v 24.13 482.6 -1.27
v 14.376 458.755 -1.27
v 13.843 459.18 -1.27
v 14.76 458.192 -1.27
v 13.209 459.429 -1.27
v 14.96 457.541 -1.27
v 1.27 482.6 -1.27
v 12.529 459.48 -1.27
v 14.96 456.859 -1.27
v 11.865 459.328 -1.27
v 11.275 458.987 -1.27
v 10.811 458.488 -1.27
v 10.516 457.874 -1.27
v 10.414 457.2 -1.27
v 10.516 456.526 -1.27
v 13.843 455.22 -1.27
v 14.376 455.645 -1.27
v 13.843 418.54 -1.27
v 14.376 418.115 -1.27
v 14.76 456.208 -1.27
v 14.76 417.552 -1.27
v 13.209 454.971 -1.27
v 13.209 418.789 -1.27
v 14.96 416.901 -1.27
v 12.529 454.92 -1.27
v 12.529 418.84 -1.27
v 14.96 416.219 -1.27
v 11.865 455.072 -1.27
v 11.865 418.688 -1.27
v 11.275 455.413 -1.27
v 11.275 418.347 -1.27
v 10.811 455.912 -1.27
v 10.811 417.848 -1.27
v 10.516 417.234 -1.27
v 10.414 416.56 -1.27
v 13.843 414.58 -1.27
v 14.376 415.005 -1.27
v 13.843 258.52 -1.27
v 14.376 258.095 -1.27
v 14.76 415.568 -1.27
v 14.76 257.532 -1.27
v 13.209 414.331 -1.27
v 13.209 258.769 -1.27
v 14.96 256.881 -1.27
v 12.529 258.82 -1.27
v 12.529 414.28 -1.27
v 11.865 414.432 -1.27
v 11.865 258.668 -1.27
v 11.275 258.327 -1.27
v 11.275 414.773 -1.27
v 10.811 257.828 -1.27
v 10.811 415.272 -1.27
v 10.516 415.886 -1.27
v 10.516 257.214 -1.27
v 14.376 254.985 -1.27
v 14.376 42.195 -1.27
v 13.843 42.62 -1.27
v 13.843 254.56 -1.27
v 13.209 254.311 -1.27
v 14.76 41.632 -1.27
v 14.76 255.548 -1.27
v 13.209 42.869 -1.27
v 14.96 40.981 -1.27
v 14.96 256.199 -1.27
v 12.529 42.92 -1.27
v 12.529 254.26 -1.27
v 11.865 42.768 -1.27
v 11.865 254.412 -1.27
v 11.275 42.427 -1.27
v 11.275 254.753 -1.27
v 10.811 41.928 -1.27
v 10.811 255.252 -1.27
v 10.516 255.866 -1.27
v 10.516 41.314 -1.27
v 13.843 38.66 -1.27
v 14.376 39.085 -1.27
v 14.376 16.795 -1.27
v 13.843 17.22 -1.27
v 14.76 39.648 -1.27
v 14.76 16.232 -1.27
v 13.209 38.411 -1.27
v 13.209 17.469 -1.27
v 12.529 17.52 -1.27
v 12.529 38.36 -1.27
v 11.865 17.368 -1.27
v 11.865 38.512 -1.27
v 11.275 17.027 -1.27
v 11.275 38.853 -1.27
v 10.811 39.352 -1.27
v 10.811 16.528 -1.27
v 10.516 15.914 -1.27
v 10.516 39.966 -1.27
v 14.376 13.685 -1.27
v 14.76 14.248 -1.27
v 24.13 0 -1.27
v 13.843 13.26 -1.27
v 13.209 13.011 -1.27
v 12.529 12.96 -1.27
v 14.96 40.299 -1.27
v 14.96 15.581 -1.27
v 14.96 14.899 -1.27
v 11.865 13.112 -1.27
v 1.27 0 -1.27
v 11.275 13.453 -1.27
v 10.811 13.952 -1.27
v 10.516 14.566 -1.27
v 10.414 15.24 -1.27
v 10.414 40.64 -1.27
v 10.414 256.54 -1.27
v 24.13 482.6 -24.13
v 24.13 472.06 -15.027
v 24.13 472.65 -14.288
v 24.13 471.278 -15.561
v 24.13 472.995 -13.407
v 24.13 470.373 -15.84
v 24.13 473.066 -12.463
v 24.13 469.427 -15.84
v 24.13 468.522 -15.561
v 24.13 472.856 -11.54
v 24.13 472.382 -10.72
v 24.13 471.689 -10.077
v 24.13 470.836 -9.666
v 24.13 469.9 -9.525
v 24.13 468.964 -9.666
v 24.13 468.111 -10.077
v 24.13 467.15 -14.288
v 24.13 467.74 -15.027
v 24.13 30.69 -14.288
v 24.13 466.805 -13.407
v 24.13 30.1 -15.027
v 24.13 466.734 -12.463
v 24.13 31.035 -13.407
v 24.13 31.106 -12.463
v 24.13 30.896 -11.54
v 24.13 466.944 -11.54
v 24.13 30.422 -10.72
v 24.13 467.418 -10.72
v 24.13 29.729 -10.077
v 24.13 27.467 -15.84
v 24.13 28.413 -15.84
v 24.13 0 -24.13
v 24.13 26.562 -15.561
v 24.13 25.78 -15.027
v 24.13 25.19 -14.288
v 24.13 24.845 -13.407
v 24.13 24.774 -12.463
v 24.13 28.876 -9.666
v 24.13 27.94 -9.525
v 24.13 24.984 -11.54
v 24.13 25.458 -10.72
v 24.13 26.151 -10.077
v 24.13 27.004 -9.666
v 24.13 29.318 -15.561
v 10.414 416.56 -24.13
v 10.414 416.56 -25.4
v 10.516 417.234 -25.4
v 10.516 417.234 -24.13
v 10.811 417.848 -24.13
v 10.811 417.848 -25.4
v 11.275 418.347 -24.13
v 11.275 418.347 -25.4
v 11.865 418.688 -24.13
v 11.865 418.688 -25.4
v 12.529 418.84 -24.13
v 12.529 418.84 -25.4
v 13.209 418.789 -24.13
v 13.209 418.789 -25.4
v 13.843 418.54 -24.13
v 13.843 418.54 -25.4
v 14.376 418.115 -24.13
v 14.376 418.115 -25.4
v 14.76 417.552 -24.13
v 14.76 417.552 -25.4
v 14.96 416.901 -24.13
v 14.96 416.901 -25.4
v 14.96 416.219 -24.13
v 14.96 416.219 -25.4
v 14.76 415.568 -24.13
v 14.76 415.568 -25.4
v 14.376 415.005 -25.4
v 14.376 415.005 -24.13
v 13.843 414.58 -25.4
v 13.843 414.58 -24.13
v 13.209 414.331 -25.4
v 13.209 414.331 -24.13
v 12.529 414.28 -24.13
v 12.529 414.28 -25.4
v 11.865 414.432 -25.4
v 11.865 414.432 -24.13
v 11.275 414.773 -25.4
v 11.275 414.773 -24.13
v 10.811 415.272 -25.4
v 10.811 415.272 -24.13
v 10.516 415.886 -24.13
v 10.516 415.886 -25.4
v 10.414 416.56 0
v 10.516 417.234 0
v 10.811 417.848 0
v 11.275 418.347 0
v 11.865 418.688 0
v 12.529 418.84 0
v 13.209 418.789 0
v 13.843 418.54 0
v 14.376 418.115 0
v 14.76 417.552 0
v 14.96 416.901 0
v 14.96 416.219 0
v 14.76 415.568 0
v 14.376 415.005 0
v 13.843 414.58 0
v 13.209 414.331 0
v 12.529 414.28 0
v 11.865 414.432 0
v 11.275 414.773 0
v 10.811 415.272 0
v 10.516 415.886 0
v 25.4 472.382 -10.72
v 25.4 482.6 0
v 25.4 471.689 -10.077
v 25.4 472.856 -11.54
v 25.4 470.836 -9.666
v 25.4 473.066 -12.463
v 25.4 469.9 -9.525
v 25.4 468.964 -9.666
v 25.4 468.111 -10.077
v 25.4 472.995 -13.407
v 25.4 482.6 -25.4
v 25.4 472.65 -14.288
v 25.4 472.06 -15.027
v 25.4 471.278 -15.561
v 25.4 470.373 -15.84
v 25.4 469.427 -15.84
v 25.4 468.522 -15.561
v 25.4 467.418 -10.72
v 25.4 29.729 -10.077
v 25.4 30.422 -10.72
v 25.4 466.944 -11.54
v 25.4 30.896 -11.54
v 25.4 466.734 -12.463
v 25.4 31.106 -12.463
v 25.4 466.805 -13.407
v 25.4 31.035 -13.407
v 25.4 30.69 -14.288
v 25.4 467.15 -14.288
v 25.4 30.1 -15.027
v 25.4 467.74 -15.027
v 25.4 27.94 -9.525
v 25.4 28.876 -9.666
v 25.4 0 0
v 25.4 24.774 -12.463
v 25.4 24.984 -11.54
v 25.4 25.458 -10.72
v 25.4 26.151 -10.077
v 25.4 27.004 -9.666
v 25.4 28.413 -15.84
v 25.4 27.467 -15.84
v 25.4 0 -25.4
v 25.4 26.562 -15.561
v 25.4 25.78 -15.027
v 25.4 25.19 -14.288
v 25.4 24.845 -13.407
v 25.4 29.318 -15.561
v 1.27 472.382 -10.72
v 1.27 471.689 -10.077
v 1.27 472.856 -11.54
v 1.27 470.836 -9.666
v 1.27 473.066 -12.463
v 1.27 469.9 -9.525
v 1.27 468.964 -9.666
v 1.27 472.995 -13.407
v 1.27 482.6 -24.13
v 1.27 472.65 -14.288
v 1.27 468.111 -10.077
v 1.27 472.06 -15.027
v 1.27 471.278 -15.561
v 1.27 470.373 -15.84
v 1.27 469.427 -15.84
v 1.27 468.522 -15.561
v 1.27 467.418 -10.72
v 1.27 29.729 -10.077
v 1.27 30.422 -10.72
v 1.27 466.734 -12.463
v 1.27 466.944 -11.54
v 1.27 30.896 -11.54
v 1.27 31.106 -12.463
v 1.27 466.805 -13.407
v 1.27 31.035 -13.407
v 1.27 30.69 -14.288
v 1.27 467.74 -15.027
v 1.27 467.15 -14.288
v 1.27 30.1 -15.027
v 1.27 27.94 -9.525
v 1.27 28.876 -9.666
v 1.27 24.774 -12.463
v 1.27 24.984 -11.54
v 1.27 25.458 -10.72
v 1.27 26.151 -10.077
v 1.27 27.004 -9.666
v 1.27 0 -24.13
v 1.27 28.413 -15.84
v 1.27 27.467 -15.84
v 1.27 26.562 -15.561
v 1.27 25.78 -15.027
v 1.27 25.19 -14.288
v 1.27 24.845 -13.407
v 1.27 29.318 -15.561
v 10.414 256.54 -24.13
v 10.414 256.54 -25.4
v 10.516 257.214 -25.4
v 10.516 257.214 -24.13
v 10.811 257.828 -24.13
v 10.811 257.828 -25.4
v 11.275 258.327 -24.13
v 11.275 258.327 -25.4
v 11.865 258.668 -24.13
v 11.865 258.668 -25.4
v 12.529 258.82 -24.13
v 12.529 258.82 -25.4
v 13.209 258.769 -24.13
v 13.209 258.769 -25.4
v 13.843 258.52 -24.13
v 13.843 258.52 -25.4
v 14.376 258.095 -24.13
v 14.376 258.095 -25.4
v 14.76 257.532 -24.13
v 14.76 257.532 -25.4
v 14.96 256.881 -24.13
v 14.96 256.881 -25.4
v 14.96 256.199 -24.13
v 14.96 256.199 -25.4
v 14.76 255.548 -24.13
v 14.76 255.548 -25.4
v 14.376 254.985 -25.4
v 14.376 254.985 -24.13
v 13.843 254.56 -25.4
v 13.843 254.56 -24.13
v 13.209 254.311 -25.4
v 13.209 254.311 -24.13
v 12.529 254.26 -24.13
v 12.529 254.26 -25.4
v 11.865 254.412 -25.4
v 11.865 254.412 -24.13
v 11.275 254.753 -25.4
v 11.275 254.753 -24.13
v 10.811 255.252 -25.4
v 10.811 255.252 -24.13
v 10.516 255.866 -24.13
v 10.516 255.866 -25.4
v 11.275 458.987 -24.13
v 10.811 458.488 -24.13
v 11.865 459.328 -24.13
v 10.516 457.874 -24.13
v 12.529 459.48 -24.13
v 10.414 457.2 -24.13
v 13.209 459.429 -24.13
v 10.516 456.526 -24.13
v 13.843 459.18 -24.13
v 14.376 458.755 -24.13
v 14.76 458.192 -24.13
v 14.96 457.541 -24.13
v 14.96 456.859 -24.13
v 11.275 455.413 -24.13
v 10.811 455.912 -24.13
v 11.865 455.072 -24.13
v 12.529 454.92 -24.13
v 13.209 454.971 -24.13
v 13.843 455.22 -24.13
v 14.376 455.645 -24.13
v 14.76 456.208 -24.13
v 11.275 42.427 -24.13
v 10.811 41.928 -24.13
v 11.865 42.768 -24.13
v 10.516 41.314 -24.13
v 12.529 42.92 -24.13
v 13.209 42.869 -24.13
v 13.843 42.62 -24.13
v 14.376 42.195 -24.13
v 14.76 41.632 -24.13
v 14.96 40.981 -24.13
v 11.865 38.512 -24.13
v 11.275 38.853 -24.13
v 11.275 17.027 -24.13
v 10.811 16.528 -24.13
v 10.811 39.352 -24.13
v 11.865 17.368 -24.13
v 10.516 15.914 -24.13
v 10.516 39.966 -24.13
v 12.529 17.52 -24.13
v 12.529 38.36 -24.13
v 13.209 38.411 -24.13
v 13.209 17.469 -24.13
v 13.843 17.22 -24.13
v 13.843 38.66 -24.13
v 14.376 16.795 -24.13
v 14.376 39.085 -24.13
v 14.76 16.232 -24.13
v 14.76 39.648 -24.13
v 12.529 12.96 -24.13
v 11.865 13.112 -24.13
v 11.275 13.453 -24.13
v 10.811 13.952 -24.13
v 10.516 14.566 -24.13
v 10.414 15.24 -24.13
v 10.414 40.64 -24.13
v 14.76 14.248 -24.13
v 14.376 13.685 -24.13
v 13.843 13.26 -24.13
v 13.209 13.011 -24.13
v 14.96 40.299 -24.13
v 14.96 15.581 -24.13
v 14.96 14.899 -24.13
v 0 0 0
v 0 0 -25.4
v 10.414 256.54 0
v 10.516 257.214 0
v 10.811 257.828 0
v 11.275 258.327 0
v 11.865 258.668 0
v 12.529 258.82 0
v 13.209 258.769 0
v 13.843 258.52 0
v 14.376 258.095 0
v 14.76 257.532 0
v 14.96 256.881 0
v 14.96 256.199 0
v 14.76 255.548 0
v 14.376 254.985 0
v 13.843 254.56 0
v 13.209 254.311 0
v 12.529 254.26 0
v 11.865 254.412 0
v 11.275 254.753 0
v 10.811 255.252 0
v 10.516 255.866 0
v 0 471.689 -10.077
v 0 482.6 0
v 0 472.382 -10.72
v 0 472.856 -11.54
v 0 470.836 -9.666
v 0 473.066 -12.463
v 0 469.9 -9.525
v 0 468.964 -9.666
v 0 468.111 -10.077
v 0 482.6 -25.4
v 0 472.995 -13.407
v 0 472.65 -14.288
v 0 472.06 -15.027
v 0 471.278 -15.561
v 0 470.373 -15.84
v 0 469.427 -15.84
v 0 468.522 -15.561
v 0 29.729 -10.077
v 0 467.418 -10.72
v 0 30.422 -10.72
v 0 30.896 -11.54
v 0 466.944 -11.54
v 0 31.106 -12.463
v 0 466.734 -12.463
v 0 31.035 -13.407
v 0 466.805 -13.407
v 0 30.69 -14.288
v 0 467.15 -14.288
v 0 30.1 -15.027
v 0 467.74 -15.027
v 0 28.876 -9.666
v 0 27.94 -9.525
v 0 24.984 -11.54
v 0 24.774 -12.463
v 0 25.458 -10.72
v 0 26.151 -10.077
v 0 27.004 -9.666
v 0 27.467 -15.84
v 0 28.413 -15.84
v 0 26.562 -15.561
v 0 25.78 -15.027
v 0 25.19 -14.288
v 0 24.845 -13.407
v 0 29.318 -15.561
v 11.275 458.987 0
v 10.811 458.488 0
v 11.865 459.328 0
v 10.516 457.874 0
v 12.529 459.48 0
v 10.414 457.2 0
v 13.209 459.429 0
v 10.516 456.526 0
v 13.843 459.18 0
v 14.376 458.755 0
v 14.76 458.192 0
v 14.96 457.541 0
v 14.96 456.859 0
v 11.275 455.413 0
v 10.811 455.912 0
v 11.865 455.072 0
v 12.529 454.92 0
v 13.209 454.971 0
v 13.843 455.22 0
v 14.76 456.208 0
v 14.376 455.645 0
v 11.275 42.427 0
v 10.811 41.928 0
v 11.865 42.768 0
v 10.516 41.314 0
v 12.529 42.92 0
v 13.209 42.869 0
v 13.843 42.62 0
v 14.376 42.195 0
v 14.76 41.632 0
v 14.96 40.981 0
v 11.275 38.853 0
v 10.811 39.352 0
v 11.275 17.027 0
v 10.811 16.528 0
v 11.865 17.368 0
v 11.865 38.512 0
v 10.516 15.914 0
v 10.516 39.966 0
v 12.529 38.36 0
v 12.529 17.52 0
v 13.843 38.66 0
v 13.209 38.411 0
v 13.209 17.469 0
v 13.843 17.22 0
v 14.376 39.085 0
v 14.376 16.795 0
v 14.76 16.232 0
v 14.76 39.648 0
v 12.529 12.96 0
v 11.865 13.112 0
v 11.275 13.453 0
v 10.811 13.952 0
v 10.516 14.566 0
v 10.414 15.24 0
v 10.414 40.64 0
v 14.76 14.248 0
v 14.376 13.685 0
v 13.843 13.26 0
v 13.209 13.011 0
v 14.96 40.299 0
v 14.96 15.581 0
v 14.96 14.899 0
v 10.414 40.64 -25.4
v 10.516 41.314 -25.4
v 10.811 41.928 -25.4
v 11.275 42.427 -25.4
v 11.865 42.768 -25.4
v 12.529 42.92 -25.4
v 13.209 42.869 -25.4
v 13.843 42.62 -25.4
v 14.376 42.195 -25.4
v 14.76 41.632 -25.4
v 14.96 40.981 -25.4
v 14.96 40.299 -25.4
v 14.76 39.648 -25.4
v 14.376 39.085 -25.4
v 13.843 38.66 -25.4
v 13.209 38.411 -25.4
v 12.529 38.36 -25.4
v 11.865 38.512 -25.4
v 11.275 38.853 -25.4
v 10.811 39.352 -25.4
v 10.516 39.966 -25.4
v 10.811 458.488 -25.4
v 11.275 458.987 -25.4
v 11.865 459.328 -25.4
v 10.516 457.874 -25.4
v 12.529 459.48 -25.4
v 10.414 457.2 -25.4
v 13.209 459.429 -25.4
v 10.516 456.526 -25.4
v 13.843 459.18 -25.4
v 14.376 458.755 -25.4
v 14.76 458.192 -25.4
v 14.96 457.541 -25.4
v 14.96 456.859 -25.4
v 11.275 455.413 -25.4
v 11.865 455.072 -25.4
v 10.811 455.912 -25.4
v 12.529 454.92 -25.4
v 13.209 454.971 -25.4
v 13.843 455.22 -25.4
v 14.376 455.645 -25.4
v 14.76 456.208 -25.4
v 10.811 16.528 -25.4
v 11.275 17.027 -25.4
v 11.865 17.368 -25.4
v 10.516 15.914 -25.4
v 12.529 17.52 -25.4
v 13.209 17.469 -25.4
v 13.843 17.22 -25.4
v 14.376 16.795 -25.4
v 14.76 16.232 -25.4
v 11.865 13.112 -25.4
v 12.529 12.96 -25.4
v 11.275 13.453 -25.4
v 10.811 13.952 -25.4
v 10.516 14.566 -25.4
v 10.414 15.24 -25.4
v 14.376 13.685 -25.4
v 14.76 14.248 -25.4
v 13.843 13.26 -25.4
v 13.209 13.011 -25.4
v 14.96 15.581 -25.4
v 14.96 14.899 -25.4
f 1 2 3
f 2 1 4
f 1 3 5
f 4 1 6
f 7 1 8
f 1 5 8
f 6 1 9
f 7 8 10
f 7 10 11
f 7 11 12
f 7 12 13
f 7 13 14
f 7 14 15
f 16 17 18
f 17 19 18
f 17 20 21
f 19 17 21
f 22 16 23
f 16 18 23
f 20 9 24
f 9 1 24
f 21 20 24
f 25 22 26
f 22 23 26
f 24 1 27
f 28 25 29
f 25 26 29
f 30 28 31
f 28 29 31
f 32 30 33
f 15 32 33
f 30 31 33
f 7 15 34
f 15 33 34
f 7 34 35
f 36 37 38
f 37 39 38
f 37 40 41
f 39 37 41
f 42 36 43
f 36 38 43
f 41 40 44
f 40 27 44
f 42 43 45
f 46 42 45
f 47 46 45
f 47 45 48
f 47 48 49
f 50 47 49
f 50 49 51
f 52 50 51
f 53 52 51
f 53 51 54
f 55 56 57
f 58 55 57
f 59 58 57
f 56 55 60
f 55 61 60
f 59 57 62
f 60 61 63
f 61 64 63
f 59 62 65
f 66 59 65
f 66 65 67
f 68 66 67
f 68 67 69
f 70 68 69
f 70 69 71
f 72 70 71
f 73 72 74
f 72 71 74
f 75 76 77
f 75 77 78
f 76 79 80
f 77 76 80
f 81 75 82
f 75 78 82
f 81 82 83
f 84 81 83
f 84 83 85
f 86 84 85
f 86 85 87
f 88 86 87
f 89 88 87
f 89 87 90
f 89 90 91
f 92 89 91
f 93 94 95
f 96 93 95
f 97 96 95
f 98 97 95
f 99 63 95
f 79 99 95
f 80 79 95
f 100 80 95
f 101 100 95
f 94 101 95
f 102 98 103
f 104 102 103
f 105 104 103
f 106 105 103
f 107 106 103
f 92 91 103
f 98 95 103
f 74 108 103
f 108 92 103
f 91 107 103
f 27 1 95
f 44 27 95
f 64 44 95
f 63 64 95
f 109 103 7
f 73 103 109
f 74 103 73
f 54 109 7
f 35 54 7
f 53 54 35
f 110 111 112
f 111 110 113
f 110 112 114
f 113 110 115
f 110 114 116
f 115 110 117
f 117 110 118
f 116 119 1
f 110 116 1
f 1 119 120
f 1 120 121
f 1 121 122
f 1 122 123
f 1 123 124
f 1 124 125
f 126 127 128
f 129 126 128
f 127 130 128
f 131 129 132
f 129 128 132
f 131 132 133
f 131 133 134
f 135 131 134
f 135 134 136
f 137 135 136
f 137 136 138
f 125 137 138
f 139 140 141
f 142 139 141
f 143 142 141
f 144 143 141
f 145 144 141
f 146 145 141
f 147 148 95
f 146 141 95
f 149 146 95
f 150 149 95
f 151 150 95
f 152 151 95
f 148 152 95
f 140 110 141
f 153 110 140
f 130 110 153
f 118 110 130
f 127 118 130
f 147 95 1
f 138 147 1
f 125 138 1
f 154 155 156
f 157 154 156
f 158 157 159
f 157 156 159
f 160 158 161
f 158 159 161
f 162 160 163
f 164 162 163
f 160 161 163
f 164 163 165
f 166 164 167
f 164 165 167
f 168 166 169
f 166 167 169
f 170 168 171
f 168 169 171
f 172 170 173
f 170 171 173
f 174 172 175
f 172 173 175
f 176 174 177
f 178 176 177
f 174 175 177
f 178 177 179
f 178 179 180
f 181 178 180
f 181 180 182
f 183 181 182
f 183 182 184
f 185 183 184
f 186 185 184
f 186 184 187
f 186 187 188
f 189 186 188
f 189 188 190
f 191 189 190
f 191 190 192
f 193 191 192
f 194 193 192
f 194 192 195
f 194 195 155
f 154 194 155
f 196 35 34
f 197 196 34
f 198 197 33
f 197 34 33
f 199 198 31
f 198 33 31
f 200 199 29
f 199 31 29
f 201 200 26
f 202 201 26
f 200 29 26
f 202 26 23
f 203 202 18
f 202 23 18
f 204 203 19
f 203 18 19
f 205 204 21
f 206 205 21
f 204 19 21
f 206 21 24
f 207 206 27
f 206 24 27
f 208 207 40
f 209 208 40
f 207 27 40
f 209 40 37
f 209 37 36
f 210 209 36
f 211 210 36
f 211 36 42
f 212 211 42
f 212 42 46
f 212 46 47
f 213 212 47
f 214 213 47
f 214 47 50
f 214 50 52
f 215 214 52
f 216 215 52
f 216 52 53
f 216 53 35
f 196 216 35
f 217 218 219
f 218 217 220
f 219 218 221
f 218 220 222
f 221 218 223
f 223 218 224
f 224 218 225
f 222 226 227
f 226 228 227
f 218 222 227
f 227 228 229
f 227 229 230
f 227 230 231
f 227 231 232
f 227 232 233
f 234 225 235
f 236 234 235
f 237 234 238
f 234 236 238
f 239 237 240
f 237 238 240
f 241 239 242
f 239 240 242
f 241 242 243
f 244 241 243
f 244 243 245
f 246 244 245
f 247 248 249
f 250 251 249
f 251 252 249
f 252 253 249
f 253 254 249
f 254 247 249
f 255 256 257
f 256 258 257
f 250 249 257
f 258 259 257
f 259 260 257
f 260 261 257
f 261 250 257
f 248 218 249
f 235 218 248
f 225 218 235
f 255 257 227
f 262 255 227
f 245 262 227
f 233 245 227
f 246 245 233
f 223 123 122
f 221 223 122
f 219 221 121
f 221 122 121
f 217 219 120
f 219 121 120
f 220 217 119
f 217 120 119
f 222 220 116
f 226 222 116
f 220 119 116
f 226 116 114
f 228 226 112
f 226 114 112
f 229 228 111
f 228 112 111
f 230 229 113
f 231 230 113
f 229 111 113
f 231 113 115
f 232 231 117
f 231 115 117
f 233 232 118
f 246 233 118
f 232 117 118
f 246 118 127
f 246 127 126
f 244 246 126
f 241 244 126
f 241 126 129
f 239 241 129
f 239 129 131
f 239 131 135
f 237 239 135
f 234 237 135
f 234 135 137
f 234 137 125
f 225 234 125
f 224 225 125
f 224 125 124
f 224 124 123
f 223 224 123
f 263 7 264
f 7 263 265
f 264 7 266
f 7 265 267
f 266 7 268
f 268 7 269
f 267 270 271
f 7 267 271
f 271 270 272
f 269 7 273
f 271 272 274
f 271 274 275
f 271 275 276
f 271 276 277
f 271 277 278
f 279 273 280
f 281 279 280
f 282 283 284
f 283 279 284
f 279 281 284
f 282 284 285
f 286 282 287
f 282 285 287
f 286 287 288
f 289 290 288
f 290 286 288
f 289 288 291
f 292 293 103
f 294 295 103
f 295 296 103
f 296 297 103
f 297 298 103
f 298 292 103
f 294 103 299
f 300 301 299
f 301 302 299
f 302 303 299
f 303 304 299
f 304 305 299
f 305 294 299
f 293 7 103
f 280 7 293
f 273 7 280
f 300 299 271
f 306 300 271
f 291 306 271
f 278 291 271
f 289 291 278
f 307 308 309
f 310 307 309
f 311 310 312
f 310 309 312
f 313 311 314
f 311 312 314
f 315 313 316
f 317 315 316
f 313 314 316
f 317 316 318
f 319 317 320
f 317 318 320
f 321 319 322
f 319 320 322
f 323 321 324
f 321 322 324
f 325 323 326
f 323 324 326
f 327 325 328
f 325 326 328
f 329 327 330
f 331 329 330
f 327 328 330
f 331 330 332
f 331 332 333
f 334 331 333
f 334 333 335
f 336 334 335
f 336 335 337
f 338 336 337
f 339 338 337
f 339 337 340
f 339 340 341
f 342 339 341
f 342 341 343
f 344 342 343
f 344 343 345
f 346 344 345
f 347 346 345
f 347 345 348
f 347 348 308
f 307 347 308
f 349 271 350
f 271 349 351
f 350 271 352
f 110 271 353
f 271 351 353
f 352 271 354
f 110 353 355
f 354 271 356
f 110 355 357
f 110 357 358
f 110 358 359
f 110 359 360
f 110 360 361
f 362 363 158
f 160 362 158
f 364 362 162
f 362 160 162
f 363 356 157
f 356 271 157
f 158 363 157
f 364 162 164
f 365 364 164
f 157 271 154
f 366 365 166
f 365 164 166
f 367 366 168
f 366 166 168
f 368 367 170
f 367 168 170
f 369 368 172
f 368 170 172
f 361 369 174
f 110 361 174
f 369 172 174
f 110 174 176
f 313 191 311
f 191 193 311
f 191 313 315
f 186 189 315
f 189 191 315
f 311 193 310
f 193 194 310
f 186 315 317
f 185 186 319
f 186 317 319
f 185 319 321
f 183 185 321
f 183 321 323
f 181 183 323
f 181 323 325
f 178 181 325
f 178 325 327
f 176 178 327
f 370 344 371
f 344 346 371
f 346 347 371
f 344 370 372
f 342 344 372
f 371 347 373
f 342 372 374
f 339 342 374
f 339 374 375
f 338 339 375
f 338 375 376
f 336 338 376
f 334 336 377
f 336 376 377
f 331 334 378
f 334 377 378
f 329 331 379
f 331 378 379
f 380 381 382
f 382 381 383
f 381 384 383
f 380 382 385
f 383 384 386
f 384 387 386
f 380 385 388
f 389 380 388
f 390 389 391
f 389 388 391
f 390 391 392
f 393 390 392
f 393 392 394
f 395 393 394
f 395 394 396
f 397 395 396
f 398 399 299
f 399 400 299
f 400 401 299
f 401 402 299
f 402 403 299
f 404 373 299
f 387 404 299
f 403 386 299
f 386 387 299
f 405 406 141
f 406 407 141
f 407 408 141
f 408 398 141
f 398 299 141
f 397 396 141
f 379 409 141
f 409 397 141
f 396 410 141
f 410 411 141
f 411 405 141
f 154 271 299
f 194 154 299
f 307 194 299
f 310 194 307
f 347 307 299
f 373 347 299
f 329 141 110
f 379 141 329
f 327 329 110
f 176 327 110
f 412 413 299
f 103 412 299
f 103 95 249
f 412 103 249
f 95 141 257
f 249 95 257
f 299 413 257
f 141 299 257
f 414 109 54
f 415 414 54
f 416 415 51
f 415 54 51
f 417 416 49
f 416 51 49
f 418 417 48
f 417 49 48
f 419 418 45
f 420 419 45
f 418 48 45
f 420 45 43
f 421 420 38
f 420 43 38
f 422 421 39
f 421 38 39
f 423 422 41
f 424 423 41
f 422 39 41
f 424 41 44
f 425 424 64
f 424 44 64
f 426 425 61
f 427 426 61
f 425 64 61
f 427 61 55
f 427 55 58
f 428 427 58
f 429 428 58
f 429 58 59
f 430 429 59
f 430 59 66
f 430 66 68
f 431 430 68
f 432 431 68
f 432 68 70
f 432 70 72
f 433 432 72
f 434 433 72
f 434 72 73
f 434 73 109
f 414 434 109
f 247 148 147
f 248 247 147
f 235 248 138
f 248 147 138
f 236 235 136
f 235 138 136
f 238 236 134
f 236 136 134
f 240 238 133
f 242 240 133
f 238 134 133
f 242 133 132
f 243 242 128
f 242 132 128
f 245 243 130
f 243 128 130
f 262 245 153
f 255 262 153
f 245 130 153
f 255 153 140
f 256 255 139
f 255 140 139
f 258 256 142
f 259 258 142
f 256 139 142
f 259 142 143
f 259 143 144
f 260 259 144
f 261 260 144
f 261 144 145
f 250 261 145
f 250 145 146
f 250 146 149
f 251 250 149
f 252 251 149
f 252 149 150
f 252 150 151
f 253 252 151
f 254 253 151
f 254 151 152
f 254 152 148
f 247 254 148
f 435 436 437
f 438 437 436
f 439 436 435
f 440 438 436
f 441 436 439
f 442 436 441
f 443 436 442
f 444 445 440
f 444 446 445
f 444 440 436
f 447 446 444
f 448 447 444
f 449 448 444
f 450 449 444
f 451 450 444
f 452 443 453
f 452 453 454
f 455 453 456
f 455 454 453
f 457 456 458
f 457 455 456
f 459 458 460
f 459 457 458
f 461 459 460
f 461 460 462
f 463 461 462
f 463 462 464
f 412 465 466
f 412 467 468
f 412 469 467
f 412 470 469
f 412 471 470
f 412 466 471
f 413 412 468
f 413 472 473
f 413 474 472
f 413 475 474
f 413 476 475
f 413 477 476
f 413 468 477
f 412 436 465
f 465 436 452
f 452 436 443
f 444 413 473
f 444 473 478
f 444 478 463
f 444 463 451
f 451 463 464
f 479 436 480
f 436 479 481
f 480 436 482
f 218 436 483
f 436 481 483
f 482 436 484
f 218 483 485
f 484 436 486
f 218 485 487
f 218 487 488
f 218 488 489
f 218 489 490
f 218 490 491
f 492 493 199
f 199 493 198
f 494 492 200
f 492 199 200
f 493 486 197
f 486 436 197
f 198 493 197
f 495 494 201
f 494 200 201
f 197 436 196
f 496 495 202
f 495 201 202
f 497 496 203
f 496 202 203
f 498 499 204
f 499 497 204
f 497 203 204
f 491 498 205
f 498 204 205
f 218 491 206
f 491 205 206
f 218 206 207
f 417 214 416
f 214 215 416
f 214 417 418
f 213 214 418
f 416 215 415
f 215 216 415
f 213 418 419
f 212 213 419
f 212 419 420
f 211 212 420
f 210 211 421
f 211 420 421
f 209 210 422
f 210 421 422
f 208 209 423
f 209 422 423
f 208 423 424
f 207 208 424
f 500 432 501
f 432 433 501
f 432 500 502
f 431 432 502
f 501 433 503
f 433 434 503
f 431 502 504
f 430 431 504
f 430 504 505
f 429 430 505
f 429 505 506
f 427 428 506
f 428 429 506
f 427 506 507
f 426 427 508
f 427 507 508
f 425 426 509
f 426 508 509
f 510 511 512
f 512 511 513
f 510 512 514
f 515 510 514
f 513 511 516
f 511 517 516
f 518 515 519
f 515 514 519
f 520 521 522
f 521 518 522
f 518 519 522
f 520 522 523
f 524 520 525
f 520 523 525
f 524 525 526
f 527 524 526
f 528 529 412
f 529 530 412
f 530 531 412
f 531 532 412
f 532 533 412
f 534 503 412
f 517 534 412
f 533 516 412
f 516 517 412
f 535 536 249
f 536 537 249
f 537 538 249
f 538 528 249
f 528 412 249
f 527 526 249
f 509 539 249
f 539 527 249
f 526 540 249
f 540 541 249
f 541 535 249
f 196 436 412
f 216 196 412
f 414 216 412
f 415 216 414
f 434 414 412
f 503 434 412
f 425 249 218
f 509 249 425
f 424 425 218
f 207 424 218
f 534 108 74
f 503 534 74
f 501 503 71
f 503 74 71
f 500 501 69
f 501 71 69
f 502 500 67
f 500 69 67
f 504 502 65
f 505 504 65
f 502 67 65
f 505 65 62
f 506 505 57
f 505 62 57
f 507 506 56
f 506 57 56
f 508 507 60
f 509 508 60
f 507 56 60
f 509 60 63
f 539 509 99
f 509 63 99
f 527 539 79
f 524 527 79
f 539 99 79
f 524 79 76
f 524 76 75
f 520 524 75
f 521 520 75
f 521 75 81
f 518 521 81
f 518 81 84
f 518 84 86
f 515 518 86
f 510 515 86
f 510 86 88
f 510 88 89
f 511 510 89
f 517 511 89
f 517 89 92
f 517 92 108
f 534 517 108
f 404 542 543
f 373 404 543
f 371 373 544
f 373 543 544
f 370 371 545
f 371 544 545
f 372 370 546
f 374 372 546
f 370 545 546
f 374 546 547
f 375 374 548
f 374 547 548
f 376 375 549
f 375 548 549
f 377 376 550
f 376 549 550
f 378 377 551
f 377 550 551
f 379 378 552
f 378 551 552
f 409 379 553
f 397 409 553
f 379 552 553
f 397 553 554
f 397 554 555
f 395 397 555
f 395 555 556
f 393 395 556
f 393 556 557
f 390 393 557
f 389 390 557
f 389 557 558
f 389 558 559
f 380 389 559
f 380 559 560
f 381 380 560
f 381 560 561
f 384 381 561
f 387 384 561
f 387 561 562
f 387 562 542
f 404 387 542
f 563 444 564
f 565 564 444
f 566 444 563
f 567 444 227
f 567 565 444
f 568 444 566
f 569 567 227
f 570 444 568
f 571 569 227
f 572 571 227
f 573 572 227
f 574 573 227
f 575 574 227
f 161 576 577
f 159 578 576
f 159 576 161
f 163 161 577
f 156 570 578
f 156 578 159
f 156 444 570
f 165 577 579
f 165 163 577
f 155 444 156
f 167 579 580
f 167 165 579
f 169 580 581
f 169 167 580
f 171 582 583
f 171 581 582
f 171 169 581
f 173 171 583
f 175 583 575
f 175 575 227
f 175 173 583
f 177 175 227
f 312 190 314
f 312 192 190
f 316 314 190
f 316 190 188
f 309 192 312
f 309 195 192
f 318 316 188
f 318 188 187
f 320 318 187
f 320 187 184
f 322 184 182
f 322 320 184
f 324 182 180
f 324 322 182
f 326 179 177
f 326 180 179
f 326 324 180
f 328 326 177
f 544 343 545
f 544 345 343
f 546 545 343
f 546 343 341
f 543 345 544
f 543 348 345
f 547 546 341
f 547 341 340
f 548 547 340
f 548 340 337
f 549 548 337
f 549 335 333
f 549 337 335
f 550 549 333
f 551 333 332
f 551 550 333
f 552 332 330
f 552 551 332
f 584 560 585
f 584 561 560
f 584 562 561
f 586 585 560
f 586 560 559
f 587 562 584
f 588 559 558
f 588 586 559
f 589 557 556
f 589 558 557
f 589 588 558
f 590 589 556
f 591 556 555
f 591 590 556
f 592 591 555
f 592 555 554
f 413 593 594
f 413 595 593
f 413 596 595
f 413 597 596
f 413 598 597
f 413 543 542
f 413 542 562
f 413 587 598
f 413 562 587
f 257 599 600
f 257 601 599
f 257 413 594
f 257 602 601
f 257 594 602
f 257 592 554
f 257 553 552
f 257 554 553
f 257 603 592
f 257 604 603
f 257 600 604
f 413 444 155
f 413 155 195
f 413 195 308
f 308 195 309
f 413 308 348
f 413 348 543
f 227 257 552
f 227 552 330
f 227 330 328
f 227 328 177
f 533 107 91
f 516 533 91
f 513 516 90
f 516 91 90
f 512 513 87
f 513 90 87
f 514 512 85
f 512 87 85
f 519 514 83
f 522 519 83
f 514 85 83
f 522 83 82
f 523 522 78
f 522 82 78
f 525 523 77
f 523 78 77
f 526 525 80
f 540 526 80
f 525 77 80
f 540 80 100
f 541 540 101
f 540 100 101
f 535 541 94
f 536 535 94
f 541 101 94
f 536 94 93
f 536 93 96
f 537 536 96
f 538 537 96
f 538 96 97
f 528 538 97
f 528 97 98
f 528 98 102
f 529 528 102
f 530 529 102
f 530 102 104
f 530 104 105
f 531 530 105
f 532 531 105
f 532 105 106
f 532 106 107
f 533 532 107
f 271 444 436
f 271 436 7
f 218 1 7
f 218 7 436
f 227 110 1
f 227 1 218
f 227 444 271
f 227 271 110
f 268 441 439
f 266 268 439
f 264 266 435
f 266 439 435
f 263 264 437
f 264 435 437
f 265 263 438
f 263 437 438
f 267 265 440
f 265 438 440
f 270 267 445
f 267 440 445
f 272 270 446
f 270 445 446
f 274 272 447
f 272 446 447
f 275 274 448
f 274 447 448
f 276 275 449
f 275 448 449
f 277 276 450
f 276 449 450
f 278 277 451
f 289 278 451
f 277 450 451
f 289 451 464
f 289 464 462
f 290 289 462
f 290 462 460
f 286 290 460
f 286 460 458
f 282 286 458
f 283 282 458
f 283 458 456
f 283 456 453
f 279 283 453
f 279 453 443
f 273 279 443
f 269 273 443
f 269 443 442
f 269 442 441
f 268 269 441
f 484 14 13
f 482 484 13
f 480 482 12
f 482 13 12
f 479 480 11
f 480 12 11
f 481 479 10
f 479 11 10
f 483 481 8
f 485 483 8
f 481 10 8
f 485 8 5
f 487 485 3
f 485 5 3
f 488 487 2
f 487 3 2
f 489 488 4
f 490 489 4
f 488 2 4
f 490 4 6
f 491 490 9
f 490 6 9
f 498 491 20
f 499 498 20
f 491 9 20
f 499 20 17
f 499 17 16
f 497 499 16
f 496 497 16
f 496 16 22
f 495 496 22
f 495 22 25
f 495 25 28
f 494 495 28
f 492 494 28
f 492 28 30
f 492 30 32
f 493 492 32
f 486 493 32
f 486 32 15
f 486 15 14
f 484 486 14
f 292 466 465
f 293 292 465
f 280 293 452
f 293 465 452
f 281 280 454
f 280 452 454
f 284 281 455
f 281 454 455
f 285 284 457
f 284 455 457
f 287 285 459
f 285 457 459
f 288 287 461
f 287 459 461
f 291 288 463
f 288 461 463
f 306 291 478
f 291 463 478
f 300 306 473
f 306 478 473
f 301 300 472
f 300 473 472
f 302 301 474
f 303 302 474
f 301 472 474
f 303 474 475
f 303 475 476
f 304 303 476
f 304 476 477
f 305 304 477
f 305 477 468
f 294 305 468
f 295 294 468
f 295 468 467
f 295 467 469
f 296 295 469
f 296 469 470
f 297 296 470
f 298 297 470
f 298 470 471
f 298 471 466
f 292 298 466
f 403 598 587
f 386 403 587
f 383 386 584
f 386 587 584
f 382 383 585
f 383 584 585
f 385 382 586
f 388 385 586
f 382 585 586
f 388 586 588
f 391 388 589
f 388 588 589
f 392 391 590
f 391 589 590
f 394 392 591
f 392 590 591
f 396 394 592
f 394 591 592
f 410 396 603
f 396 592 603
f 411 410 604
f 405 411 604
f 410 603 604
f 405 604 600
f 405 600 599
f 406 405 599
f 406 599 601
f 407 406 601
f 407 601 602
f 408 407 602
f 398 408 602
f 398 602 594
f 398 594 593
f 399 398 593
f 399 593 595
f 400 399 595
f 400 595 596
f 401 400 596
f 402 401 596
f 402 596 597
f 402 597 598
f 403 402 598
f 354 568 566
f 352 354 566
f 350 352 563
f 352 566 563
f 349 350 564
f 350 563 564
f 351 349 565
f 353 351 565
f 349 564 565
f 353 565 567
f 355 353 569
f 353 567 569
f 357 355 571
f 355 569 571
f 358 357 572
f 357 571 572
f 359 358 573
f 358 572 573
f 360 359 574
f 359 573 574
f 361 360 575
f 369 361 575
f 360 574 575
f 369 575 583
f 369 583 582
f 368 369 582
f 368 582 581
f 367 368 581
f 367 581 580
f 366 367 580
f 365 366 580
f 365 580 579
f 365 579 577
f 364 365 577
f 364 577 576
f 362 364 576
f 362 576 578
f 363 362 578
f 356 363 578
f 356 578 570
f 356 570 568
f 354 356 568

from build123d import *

# Parameters (mm, degrees)
SKETCH1_W           = 25.4
SKETCH1_H           = 25.4
BOSS_EXTRUDE1_DEPTH = 482.6
SKETCH2_R           = 2.286
CUT_EXTRUDE1_DEPTH  = 484.934995635
SKETCH3_R           = 2.286
CUT_EXTRUDE2_DEPTH  = 484.934995635
SKETCH4_R           = 2.286
CUT_EXTRUDE3_DEPTH  = 484.934995635
SKETCH6_R           = 2.286
CUT_EXTRUDE5_DEPTH  = 484.934995635
SKETCH7_R           = 2.286
CUT_EXTRUDE6_DEPTH  = 484.934995635
SKETCH8_R           = 3.175
CUT_EXTRUDE7_DEPTH  = 484.934995635
SKETCH9_R           = 3.175
CUT_EXTRUDE8_DEPTH  = 484.934995635


with BuildPart() as part:
    # Sketch1 → Boss-Extrude1 (new body)
    with BuildSketch(Plane(origin=(0, 0, 0), x_dir=(1, 0, 0), z_dir=(0, 1, 0))):
        with Locations((12.7, 12.7)):
            Rectangle(SKETCH1_W, SKETCH1_H)
        Polygon((1.27, 12.361459156), (1.27, 24.13), (12.7, 24.13), (24.13, 24.13), (24.13, 12.7), (24.13, 1.27), (12.7, 1.27), (1.27, 1.27), align=None, mode=Mode.SUBTRACT)
    extrude(amount=BOSS_EXTRUDE1_DEPTH)

    # Sketch2 → Cut-Extrude1 (cut, through all)
    with BuildSketch(Plane(origin=(0, 0, -25.4), x_dir=(-1, 0, 0), z_dir=(0, 0, -1))):
        with Locations((-12.7, 416.56)):
            Circle(SKETCH2_R)
    extrude(amount=-CUT_EXTRUDE1_DEPTH, mode=Mode.SUBTRACT)

    # Sketch3 → Cut-Extrude2 (cut, through all)
    with BuildSketch(Plane(origin=(0, 0, -25.4), x_dir=(-1, 0, 0), z_dir=(0, 0, -1))):
        with Locations((-12.7, 40.64)):
            Circle(SKETCH3_R)
    extrude(amount=-CUT_EXTRUDE2_DEPTH, mode=Mode.SUBTRACT)

    # Sketch4 → Cut-Extrude3 (cut, through all)
    with BuildSketch(Plane(origin=(0, 0, -25.4), x_dir=(-1, 0, 0), z_dir=(0, 0, -1))):
        with Locations((-12.7, 256.54)):
            Circle(SKETCH4_R)
    extrude(amount=-CUT_EXTRUDE3_DEPTH, mode=Mode.SUBTRACT)

    # Sketch6 → Cut-Extrude5 (cut, through all)
    with BuildSketch(Plane(origin=(0, 0, -25.4), x_dir=(-1, 0, 0), z_dir=(0, 0, -1))):
        with Locations((-12.7, 457.2)):
            Circle(SKETCH6_R)
    extrude(amount=-CUT_EXTRUDE5_DEPTH, mode=Mode.SUBTRACT)

    # Sketch7 → Cut-Extrude6 (cut, through all)
    with BuildSketch(Plane(origin=(0, 0, -25.4), x_dir=(-1, 0, 0), z_dir=(0, 0, -1))):
        with Locations((-12.7, 15.24)):
            Circle(SKETCH7_R)
    extrude(amount=-CUT_EXTRUDE6_DEPTH, mode=Mode.SUBTRACT)

    # Sketch8 → Cut-Extrude7 (cut, through all)
    with BuildSketch(Plane.ZY):
        with Locations((-12.7, 469.9)):
            Circle(SKETCH8_R)
    extrude(amount=-CUT_EXTRUDE7_DEPTH, mode=Mode.SUBTRACT)

    # Sketch9 → Cut-Extrude8 (cut, through all)
    with BuildSketch(Plane.ZY):
        with Locations((-12.7, 27.94)):
            Circle(SKETCH9_R)
    extrude(amount=-CUT_EXTRUDE8_DEPTH, mode=Mode.SUBTRACT)


solid = part.part
